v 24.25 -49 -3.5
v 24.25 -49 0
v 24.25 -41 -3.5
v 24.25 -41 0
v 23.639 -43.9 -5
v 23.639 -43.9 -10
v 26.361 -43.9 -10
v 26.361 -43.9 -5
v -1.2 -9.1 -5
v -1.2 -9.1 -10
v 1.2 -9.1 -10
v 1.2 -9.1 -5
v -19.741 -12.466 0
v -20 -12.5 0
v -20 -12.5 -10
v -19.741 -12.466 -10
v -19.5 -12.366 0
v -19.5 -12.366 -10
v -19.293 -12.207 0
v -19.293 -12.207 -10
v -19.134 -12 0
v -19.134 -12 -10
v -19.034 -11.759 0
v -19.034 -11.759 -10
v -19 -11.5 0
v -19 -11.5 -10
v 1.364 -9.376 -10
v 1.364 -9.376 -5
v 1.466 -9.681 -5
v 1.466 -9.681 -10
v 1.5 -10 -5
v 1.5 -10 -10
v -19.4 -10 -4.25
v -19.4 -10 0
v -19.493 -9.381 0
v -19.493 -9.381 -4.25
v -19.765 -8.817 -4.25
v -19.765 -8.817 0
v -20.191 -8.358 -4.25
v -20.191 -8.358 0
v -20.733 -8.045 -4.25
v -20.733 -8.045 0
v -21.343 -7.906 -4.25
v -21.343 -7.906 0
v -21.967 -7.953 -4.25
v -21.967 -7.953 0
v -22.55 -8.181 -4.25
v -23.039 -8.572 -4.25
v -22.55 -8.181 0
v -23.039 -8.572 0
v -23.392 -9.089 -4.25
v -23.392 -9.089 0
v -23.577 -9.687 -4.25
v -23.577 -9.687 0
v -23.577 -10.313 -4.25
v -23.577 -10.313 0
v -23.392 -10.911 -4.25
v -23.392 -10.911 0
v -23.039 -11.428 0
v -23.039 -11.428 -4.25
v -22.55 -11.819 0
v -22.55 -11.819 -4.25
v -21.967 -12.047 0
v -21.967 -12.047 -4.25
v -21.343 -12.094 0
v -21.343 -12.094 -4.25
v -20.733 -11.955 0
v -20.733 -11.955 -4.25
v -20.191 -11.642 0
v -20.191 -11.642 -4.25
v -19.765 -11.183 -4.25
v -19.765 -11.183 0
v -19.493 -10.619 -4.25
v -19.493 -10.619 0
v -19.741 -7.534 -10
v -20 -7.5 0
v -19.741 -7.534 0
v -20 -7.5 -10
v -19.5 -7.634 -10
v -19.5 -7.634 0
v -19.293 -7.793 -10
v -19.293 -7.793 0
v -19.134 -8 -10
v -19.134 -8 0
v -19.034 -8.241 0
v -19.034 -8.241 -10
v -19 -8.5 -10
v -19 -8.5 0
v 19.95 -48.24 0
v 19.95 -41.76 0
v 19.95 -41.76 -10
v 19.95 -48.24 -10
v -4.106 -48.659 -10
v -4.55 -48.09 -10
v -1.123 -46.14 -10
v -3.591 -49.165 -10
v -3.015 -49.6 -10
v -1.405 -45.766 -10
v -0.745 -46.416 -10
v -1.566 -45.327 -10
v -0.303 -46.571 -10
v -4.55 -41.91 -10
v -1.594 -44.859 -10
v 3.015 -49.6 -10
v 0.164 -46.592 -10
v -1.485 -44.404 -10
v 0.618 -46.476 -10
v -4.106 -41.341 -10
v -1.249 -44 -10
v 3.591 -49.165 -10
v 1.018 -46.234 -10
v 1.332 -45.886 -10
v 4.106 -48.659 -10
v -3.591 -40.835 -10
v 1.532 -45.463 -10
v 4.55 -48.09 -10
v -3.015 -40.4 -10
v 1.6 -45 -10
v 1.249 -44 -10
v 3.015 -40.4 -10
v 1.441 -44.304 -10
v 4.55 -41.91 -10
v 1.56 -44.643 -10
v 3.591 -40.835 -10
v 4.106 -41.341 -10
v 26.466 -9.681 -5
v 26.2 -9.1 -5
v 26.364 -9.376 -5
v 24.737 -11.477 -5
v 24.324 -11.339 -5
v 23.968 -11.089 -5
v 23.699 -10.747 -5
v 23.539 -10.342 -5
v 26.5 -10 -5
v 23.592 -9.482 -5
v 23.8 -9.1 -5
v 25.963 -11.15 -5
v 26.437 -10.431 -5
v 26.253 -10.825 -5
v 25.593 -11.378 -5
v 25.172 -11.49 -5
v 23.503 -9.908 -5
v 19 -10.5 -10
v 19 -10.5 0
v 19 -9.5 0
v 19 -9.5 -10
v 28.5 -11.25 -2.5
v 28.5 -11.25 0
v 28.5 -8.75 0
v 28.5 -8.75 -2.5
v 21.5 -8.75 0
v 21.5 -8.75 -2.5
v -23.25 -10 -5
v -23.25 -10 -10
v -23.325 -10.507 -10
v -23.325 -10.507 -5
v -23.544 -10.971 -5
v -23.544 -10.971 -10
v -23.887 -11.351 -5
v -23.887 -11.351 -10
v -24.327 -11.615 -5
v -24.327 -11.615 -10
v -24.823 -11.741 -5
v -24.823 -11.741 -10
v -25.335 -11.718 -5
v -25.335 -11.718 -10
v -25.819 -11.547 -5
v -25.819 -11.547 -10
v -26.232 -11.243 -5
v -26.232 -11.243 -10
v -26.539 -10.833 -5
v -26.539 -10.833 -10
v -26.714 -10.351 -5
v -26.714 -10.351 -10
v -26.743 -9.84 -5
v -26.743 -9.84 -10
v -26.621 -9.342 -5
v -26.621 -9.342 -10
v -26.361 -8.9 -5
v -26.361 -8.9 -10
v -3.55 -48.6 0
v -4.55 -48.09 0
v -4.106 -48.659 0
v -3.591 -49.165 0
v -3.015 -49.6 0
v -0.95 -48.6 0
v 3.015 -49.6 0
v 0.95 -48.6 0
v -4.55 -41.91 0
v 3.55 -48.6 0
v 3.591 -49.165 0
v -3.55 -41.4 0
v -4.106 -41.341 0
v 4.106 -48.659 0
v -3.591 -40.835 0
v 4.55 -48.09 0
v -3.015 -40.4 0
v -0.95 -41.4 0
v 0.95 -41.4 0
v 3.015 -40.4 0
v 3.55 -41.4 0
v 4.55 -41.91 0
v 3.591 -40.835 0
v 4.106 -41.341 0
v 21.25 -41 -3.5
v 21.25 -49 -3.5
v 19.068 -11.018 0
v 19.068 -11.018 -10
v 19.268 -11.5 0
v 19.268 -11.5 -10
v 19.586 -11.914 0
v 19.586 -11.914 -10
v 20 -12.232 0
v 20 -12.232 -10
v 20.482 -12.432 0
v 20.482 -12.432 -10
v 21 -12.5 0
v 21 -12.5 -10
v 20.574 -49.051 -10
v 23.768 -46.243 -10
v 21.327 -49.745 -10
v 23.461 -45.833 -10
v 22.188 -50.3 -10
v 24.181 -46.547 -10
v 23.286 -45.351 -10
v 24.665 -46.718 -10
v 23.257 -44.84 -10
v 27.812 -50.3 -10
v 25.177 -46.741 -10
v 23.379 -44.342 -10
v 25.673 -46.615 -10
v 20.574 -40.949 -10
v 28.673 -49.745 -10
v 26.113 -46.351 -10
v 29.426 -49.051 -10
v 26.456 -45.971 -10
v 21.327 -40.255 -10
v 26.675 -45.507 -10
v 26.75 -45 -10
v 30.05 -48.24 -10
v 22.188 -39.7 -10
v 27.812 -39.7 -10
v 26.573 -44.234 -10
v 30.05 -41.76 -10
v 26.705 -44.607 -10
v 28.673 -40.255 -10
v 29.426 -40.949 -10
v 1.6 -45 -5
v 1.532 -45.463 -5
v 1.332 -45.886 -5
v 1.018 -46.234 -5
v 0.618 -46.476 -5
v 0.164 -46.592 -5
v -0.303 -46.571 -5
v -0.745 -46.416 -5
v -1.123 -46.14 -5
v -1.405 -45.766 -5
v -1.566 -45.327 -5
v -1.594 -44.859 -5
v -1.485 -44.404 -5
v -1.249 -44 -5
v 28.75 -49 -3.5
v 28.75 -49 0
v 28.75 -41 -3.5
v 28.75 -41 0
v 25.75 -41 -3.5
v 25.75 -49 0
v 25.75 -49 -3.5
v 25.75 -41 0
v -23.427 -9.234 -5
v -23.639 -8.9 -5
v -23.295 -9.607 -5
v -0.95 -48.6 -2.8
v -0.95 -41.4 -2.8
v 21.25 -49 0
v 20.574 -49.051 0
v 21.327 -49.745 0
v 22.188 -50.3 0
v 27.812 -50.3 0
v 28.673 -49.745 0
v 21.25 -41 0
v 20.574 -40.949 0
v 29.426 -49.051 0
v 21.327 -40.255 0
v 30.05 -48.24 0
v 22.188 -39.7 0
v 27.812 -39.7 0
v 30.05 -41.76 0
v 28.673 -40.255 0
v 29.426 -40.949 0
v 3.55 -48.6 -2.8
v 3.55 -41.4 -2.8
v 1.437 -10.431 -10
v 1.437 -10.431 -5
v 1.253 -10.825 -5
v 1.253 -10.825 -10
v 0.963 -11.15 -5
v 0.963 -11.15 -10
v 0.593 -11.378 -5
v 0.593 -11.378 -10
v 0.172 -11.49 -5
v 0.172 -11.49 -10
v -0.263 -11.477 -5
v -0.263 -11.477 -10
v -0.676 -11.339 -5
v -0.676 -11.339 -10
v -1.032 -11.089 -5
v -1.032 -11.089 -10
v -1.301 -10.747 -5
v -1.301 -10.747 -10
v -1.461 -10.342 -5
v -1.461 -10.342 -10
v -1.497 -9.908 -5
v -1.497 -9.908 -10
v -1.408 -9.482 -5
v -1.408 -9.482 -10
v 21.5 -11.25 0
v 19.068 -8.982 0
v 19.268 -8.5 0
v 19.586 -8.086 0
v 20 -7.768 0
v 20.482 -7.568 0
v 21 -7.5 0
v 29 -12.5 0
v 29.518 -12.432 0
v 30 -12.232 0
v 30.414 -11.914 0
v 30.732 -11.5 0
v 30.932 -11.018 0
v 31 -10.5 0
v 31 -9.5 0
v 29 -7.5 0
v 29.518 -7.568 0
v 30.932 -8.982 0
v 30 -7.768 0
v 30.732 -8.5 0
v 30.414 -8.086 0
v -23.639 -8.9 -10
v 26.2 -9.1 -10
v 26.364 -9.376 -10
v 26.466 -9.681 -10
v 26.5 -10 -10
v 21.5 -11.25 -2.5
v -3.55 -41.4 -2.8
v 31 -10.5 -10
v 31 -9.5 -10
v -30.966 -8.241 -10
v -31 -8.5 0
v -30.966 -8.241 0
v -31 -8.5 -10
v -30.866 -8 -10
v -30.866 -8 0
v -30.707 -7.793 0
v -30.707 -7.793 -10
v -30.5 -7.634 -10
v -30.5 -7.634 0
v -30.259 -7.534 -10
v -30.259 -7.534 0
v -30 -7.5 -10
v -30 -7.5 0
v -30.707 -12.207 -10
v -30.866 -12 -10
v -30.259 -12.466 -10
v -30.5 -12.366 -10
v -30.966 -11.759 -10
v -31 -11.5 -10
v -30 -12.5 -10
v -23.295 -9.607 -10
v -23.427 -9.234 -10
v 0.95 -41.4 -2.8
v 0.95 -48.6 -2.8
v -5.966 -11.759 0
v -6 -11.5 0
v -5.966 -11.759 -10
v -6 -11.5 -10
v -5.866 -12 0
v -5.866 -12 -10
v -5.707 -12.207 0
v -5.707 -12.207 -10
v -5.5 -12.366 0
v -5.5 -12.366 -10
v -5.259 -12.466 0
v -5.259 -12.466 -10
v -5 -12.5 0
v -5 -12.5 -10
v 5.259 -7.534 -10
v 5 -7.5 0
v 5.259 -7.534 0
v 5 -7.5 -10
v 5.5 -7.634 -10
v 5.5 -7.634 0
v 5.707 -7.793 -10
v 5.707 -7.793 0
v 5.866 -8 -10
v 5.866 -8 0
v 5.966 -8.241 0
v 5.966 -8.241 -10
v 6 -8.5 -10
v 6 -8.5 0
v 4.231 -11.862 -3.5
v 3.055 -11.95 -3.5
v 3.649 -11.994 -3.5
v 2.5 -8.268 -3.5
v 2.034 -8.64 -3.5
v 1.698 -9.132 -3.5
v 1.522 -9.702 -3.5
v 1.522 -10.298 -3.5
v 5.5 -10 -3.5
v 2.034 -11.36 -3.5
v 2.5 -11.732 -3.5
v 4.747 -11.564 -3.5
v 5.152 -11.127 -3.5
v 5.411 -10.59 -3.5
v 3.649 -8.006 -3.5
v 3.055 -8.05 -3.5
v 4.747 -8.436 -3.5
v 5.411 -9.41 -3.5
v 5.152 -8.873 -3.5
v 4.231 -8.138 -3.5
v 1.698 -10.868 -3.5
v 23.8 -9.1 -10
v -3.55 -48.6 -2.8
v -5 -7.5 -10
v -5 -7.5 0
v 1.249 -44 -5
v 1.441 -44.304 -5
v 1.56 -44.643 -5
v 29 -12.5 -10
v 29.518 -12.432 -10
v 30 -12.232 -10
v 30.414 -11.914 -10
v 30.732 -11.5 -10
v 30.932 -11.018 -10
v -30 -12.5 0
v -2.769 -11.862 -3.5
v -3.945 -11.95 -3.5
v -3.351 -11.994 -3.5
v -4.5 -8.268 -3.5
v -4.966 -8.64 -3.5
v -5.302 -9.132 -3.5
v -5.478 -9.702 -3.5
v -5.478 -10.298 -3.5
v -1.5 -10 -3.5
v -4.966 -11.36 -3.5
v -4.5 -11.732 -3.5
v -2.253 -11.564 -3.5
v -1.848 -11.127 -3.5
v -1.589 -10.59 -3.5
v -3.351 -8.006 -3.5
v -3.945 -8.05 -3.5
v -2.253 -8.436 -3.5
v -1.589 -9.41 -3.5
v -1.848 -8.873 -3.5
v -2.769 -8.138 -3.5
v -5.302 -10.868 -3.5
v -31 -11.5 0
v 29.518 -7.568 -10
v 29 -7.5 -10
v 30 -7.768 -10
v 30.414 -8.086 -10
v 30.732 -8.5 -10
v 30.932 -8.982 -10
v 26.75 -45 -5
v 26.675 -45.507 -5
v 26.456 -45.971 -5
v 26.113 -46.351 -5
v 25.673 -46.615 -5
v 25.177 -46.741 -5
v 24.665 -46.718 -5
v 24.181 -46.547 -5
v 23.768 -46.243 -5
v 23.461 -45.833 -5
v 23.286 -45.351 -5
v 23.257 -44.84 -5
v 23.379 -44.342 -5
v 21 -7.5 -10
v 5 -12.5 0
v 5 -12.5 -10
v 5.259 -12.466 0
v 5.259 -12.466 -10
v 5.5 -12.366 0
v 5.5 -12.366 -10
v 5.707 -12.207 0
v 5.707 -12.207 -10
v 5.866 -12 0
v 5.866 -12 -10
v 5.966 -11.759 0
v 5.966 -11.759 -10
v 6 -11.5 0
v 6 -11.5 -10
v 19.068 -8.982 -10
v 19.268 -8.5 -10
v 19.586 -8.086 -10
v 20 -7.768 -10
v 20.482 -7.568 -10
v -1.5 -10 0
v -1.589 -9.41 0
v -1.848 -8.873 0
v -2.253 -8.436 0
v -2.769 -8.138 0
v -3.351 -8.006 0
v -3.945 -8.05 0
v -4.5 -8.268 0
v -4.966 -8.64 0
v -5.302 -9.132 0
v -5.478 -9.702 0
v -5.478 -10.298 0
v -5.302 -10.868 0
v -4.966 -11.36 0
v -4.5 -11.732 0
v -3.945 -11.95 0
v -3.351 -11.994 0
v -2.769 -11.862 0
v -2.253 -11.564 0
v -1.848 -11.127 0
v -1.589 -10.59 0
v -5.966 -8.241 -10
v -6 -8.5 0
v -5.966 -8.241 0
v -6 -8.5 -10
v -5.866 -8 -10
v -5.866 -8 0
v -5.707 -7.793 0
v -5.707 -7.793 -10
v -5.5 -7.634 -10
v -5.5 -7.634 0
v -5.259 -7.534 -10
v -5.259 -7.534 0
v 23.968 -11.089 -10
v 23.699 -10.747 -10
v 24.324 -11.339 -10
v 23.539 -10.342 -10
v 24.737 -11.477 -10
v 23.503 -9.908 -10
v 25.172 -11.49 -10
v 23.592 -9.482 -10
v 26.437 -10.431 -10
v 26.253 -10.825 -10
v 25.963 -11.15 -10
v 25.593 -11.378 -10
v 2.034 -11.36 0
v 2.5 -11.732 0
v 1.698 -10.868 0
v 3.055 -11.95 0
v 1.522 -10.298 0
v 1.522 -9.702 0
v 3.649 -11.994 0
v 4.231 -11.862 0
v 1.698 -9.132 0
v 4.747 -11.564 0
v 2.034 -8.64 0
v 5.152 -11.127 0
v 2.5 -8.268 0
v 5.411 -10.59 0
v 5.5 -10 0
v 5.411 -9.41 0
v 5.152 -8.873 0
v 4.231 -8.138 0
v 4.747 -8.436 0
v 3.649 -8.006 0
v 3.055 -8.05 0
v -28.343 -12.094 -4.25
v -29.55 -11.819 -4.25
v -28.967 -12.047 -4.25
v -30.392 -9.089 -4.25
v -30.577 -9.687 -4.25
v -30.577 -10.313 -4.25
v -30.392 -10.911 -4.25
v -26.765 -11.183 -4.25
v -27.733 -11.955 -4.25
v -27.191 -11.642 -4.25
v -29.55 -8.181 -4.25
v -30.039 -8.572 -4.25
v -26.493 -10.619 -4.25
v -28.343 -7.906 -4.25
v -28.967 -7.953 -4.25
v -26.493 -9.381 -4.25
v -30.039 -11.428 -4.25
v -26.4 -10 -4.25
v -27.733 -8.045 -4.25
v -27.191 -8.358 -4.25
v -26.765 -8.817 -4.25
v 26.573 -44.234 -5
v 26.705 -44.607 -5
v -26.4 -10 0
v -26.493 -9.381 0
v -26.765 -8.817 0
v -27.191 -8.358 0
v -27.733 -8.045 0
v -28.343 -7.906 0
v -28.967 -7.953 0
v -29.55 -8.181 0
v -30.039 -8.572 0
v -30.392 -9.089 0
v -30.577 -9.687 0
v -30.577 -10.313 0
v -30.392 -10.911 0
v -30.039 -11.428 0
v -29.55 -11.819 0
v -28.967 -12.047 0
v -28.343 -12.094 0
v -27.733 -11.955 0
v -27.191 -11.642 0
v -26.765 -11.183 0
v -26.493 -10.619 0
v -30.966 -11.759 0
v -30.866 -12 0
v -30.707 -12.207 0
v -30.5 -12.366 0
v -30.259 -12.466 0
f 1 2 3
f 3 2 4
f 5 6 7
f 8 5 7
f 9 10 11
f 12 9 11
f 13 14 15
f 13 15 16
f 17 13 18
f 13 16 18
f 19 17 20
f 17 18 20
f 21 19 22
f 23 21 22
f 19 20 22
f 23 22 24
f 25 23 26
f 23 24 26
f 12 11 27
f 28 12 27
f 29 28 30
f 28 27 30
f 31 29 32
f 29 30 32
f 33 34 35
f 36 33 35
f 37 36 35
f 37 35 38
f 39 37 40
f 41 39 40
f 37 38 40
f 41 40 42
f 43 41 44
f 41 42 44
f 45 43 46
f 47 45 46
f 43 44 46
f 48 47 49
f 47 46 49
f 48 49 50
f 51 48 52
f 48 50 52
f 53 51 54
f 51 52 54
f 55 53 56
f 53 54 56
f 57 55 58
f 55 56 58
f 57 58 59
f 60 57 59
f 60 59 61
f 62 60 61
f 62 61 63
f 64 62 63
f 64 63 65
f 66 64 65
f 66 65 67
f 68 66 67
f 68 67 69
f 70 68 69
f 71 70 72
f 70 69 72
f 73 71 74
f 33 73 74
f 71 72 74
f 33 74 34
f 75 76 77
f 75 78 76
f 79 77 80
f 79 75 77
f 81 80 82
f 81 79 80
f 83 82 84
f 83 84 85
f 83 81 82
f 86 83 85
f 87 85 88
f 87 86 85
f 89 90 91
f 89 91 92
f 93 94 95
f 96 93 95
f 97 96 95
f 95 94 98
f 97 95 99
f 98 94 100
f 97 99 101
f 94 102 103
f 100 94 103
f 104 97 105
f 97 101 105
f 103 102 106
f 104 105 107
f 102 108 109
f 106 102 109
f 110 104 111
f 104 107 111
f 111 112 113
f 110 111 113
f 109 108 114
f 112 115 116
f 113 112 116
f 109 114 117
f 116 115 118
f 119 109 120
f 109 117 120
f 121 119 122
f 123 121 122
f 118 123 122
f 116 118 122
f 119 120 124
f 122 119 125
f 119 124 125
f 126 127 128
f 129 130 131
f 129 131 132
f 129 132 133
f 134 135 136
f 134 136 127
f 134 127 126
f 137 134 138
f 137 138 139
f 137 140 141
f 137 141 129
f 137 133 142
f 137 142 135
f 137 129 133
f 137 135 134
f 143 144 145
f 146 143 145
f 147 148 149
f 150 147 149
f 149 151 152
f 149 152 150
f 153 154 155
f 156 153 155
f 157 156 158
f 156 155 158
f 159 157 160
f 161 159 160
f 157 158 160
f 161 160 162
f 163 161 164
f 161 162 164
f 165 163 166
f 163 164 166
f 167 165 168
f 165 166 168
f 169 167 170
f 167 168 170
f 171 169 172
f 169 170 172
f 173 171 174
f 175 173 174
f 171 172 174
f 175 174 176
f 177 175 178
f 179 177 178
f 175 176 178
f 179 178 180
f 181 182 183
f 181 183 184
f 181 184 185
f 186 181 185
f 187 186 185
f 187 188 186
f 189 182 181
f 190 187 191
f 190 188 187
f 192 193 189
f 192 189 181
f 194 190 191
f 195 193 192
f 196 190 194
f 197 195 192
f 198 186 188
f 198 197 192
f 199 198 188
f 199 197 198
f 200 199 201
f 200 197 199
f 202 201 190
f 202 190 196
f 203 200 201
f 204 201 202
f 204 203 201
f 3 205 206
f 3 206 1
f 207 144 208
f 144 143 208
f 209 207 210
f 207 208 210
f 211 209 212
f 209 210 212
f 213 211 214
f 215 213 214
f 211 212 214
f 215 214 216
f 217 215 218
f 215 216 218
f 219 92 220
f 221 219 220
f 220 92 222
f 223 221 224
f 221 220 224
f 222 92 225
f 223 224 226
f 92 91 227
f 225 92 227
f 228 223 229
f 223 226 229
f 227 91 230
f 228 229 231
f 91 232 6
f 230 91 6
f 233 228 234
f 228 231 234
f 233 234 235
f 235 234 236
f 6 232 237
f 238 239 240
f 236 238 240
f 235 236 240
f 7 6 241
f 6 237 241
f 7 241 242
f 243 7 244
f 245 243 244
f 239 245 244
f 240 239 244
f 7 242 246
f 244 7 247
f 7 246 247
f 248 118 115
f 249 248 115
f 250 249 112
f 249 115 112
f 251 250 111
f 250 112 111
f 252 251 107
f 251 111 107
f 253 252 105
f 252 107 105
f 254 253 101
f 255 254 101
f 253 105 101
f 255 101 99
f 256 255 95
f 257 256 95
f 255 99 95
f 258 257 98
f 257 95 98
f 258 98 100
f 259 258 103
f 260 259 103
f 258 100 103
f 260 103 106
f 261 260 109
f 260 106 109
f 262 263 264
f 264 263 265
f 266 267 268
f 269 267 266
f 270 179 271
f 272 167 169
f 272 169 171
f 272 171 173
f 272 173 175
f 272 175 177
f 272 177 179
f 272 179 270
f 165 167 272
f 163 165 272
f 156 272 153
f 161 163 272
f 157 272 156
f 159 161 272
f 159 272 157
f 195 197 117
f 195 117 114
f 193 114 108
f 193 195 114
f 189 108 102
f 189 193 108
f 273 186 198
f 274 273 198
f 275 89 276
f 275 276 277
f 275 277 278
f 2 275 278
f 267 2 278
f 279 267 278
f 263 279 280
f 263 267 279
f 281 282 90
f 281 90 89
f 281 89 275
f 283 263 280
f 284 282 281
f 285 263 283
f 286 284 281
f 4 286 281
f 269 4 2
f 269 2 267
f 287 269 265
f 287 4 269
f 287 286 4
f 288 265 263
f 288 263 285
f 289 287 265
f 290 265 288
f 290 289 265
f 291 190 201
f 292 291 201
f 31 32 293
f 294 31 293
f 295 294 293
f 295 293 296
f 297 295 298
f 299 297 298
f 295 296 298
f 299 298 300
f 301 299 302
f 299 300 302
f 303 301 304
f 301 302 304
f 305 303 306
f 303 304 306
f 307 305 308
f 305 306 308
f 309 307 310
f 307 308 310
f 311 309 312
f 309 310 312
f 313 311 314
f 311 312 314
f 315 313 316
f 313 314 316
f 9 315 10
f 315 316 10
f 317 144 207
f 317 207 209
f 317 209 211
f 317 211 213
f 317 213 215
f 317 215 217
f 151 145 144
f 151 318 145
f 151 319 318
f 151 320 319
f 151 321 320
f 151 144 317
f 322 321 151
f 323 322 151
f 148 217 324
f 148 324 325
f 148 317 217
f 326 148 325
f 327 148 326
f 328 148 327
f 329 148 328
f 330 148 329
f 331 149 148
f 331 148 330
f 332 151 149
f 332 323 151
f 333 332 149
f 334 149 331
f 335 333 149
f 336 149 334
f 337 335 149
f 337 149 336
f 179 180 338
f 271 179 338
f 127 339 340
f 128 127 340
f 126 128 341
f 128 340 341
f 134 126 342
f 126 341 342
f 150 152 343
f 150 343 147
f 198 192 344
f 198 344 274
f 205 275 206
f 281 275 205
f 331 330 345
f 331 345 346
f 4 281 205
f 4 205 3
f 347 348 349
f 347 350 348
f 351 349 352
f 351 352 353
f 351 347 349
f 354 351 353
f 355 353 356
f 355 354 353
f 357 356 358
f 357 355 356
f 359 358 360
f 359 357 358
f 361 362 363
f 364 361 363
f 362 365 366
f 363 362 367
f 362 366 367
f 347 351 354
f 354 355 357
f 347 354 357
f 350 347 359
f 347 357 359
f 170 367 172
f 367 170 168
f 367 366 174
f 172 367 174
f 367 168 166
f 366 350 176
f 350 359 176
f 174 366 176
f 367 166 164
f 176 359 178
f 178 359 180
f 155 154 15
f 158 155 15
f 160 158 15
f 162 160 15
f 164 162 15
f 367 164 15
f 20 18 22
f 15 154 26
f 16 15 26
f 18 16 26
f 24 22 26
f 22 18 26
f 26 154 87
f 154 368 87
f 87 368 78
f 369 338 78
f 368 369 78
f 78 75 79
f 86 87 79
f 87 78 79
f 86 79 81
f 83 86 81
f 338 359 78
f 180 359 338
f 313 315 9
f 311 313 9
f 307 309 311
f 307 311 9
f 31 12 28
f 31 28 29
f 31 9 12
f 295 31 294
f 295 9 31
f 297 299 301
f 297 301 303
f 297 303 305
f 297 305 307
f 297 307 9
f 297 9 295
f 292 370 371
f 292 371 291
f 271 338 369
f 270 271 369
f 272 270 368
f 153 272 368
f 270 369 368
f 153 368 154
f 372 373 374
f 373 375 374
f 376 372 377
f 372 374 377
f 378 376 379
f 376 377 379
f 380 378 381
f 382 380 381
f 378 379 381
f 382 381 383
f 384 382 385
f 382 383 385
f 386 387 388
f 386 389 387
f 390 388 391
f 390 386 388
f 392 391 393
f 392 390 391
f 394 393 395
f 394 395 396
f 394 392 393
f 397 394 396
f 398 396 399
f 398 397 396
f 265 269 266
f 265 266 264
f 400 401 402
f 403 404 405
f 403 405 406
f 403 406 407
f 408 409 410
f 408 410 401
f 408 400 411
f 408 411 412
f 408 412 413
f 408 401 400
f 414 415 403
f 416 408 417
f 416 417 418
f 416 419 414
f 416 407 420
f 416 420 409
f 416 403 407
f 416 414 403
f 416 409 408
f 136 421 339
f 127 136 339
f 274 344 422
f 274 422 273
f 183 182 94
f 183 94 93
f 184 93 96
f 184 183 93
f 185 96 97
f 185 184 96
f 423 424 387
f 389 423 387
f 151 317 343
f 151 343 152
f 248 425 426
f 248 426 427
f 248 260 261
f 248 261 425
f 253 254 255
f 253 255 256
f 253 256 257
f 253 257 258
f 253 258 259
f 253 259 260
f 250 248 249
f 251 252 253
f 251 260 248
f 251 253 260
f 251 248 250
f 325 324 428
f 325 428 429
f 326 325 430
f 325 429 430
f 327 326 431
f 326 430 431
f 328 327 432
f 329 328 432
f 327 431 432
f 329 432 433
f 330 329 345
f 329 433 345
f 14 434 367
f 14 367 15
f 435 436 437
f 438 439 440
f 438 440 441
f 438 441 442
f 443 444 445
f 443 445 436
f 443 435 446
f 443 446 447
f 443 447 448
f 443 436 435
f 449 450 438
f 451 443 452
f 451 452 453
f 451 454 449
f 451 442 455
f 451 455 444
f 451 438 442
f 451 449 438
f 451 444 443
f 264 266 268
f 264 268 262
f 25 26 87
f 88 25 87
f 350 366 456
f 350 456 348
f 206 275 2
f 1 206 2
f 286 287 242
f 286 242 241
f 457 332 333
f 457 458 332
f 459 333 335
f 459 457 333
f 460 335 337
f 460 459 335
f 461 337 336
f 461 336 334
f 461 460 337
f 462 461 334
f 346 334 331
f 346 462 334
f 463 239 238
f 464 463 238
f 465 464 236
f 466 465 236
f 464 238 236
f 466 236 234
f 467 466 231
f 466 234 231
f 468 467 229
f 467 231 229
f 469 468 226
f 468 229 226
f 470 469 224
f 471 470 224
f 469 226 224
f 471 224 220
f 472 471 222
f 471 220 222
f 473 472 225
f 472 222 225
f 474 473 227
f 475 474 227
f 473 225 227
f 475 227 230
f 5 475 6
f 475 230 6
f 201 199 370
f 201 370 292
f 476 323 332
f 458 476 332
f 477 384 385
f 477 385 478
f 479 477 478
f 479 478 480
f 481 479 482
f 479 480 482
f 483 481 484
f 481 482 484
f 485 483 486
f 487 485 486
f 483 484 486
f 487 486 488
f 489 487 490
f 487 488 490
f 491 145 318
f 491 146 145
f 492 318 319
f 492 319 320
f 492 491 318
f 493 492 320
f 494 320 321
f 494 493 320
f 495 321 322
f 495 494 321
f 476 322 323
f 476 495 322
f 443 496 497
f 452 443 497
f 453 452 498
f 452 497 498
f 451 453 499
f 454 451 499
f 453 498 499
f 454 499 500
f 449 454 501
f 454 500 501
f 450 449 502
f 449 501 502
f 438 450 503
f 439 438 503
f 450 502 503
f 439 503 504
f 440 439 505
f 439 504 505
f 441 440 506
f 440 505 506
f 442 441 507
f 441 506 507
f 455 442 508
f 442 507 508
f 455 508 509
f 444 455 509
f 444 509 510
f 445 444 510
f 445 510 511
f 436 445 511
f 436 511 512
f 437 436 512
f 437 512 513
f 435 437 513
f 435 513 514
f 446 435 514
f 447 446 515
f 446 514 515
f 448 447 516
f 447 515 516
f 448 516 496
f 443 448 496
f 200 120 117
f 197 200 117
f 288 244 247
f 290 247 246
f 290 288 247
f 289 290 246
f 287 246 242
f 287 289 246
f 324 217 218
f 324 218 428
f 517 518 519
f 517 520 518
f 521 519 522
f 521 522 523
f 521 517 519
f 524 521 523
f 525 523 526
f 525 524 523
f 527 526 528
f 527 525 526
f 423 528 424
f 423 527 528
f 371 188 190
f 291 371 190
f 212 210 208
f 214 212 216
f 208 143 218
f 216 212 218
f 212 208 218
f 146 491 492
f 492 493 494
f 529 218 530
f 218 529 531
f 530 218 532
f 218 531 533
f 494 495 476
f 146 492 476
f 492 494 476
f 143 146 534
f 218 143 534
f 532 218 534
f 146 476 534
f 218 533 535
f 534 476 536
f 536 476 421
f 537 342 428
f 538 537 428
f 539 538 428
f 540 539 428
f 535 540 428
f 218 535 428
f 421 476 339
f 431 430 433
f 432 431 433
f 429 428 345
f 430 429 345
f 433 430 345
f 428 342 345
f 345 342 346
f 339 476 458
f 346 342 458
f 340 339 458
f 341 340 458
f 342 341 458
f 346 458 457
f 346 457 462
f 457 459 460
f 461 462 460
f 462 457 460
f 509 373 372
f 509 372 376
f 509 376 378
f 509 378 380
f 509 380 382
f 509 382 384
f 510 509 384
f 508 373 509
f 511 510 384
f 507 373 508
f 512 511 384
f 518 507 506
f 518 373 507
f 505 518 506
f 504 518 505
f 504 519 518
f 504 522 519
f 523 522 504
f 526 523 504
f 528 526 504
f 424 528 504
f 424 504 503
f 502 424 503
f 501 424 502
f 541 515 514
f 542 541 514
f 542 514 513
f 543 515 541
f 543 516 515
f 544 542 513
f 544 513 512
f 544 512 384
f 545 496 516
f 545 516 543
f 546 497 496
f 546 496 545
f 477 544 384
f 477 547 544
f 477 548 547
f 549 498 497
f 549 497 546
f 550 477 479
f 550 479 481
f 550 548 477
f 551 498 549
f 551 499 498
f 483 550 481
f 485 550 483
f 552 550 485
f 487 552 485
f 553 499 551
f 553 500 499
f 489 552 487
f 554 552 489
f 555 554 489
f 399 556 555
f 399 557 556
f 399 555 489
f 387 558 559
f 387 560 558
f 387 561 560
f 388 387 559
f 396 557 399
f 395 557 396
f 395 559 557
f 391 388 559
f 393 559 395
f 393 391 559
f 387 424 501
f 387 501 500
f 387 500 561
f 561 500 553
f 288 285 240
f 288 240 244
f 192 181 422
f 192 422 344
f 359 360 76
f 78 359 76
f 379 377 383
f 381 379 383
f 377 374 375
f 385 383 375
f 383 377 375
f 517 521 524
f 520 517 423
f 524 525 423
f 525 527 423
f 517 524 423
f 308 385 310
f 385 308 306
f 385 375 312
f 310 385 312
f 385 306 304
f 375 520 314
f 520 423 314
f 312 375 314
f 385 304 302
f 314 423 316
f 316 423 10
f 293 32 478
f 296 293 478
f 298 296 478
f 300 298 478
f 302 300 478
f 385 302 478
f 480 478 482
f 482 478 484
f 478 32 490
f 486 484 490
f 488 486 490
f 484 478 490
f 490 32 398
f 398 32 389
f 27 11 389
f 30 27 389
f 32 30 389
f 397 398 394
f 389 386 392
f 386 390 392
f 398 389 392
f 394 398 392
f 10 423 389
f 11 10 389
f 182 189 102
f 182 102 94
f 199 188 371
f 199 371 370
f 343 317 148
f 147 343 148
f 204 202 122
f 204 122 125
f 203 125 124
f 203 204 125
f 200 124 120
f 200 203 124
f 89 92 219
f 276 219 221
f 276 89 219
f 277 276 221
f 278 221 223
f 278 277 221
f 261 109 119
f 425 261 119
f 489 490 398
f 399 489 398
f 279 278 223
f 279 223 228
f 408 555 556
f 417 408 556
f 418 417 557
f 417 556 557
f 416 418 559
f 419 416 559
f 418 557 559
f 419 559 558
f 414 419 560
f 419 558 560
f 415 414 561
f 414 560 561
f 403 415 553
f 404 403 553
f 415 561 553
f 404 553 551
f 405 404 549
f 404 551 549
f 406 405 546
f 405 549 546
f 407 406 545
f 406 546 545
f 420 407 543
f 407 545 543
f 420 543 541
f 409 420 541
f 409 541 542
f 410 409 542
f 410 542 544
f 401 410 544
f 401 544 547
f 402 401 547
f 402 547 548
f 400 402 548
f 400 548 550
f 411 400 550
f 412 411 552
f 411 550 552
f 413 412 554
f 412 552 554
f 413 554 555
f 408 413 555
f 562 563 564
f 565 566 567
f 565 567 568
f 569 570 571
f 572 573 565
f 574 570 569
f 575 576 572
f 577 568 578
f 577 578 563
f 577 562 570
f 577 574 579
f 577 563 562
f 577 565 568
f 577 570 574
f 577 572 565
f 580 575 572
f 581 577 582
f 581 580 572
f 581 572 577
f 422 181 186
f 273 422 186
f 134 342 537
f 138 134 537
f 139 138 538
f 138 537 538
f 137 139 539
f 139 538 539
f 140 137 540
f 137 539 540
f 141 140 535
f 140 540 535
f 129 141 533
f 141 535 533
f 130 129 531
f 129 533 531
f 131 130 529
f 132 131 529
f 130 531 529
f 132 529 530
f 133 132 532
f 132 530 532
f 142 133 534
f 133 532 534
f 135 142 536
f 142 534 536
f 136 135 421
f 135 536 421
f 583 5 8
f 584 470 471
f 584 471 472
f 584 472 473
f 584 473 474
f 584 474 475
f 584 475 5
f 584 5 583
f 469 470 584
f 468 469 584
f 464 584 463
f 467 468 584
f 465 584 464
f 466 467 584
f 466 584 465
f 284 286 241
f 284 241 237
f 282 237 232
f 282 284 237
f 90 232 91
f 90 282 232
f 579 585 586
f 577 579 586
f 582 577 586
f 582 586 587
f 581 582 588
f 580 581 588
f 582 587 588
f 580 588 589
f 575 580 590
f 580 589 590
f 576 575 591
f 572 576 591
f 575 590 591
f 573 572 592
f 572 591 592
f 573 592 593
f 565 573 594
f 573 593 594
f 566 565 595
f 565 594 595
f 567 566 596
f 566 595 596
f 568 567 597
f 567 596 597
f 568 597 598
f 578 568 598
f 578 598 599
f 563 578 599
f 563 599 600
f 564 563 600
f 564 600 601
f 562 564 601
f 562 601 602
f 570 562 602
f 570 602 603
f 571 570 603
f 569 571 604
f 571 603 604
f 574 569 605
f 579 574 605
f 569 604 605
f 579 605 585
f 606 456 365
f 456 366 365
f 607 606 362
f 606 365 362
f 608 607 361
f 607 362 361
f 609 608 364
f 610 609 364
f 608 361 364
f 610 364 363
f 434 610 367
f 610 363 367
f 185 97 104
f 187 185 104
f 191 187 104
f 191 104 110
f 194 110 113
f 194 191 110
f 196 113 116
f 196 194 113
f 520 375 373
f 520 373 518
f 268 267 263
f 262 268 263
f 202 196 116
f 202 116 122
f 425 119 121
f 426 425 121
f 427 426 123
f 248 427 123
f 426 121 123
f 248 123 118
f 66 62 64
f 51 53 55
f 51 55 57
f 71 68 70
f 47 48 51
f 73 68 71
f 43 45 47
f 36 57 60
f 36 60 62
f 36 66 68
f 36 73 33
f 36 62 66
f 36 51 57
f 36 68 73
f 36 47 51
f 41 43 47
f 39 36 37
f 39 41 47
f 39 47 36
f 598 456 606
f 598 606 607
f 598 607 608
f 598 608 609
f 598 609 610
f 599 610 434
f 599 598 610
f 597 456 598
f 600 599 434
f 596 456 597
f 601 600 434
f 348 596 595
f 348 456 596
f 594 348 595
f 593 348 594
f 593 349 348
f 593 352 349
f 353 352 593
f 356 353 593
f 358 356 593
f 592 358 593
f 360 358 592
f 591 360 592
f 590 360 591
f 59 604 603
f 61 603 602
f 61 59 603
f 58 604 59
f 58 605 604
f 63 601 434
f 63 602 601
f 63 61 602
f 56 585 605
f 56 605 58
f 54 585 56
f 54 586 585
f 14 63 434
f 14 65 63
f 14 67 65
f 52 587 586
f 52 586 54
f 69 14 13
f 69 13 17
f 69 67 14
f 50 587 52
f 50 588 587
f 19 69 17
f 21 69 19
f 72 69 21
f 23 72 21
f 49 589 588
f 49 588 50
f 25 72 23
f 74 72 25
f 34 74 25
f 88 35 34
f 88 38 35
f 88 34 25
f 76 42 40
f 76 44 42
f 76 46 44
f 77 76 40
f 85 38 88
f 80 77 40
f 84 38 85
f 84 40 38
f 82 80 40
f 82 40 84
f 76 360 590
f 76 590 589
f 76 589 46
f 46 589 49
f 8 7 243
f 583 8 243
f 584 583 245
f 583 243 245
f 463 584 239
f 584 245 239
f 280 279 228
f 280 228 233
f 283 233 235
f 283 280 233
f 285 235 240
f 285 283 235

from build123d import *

# Parameters (mm, degrees)
F0_W      = 12
F0_H      = 5
F0_R      = 2
F1_DEPTH  = 10
F2_DEPTH  = 3.5
F4_R      = 1
F0_W_2    = 7
F0_H_2    = 2.5
F5_DEPTH  = 10
F7_DEPTH  = 2.5
F8_DEPTH  = 5
F9_R      = 2
F10_DEPTH = 5
F0_W_3    = 2.6
F0_H_3    = 7.2
F11_DEPTH = 10
F12_DEPTH = 2.8
F14_DEPTH = 5
F0_W_4    = 3
F0_H_4    = 8
F15_DEPTH = 10
F16_DEPTH = 3.5
F18_DEPTH = 5
F0_R_2    = 2.1
F19_DEPTH = 10
F20_DEPTH = 4.25
F22_DEPTH = 5
F23_R     = 1


with BuildPart() as f1:
    # F0 (on Top) → F1 (new body)
    with BuildSketch(Plane.XY):
        with Locations((0, -10)):
            Rectangle(F0_W, F0_H)
        with Locations((-3.5, -10)):
            Circle(F0_R, mode=Mode.SUBTRACT)
        with Locations((3.5, -10)):
            Circle(F0_R, mode=Mode.SUBTRACT)
        with Locations((-3.5, -10)):
            Circle(F0_R)
        with Locations((3.5, -10)):
            Circle(F0_R)
    extrude(amount=-F1_DEPTH)

    # F0 (on Top) → F2 (cut)
    with BuildSketch(Plane.XY):
        with Locations((-3.5, -10)):
            Circle(F0_R)
        with Locations((3.5, -10)):
            Circle(F0_R)
    extrude(amount=-F2_DEPTH, mode=Mode.SUBTRACT)

    # F4
    f4_edges = [f1.edges().sort_by_distance(p)[0] for p in [
        (6, -12.5, -5),
        (6, -7.5, -5),
        (-6, -12.5, -5),
        (-6, -7.5, -5),
    ]]
    fillet(f4_edges, radius=F4_R)

    # F3 (on face) → F10 (cut)
    with BuildSketch(Plane(origin=(0, 0, -10), x_dir=(1, 0, 0), z_dir=(0, 0, -1))):
        with BuildLine():
            ThreePointArc((1.2, 9.1), (1.4230249471, 9.525658351), (1.5, 10))
            ThreePointArc((1.5, 10), (-0.474341649, 11.4230249471), (-1.2, 9.1))
            Line((-1.2, 9.1), (1.2, 9.1))
        make_face()
    extrude(amount=-F10_DEPTH, mode=Mode.SUBTRACT)


with BuildPart() as f5:
    # F0 (on Top) → F5 (new body)
    with BuildSketch(Plane.XY):
        with Locations((25, -10)):
            Rectangle(F0_W, F0_H)
        with Locations((25, -10)):
            Rectangle(F0_W_2, F0_H_2, mode=Mode.SUBTRACT)
        with Locations((25, -10)):
            Rectangle(F0_W_2, F0_H_2)
    extrude(amount=-F5_DEPTH)

    # F0 (on Top) → F7 (cut)
    with BuildSketch(Plane.XY):
        with Locations((25, -10)):
            Rectangle(F0_W_2, F0_H_2)
    extrude(amount=-F7_DEPTH, mode=Mode.SUBTRACT)

    # F6 (on face) → F8 (cut)
    with BuildSketch(Plane(origin=(0, 0, -10), x_dir=(1, 0, 0), z_dir=(0, 0, -1))):
        with BuildLine():
            ThreePointArc((26.2, 9.1), (26.4230249471, 9.525658351), (26.5, 10))
            ThreePointArc((26.5, 10), (24.525658351, 11.4230249471), (23.8, 9.1))
            Line((23.8, 9.1), (26.2, 9.1))
        make_face()
    extrude(amount=-F8_DEPTH, mode=Mode.SUBTRACT)

    # F9
    f9_edges = [f5.edges().sort_by_distance(p)[0] for p in [
        (19, -12.5, -5),
        (31, -12.5, -5),
        (31, -7.5, -5),
        (19, -7.5, -5),
    ]]
    fillet(f9_edges, radius=F9_R)


with BuildPart() as f11:
    # F0 (on Top) → F11 (new body)
    with BuildSketch(Plane.XY):
        with BuildLine():
            Line((4.55, -48.0899029111), (4.55, -41.9100970889))
            ThreePointArc((4.55, -41.9100970889), (3.8571055749, -41.0791918455), (3.0149626863, -40.4))
            Line((3.0149626863, -40.4), (-3.0149626863, -40.4))
            ThreePointArc((-3.0149626863, -40.4), (-3.8571055749, -41.0791918455), (-4.55, -41.9100970889))
            Line((-4.55, -41.9100970889), (-4.55, -48.0899029111))
            ThreePointArc((-4.55, -48.0899029111), (-3.8571055749, -48.9208081545), (-3.0149626863, -49.6))
            Line((-3.0149626863, -49.6), (3.0149626863, -49.6))
            ThreePointArc((3.0149626863, -49.6), (3.8571055749, -48.9208081545), (4.55, -48.0899029111))
        make_face()
        with Locations((-2.25, -45)):
            Rectangle(F0_W_3, F0_H_3, mode=Mode.SUBTRACT)
        with Locations((2.25, -45)):
            Rectangle(F0_W_3, F0_H_3, mode=Mode.SUBTRACT)
        with Locations((-2.25, -45)):
            Rectangle(F0_W_3, F0_H_3)
        with Locations((2.25, -45)):
            Rectangle(F0_W_3, F0_H_3)
    extrude(amount=-F11_DEPTH)

    # F0 (on Top) → F12 (cut)
    with BuildSketch(Plane.XY):
        with Locations((-2.25, -45)):
            Rectangle(F0_W_3, F0_H_3)
        with Locations((2.25, -45)):
            Rectangle(F0_W_3, F0_H_3)
    extrude(amount=-F12_DEPTH, mode=Mode.SUBTRACT)

    # F13 (on face) → F14 (cut)
    with BuildSketch(Plane(origin=(0, 0, -10), x_dir=(1, 0, 0), z_dir=(0, 0, -1))):
        with BuildLine():
            ThreePointArc((1.2489995997, 44), (1.5097018513, 44.4700940458), (1.6, 45))
            ThreePointArc((1.6, 45), (-0.5299059542, 46.5097018513), (-1.2489995997, 44))
            Line((-1.2489995997, 44), (1.2489995997, 44))
        make_face()
    extrude(amount=-F14_DEPTH, mode=Mode.SUBTRACT)


with BuildPart() as f15:
    # F0 (on Top) → F15 (new body)
    with BuildSketch(Plane.XY):
        with BuildLine():
            Line((30.05, -48.2399845679), (30.05, -41.7600154321))
            ThreePointArc((30.05, -41.7600154321), (29.0639307642, -40.5858787121), (27.8124722221, -39.7))
            Line((27.8124722221, -39.7), (22.1875277779, -39.7))
            ThreePointArc((22.1875277779, -39.7), (20.9360692358, -40.5858787121), (19.95, -41.7600154321))
            Line((19.95, -41.7600154321), (19.95, -48.2399845679))
            ThreePointArc((19.95, -48.2399845679), (20.9360692358, -49.4141212879), (22.1875277779, -50.3))
            Line((22.1875277779, -50.3), (27.8124722221, -50.3))
            ThreePointArc((27.8124722221, -50.3), (29.0639307642, -49.4141212879), (30.05, -48.2399845679))
        make_face()
        with Locations((22.75, -45)):
            Rectangle(F0_W_4, F0_H_4, mode=Mode.SUBTRACT)
        with Locations((27.25, -45)):
            Rectangle(F0_W_4, F0_H_4, mode=Mode.SUBTRACT)
        with Locations((22.75, -45)):
            Rectangle(F0_W_4, F0_H_4)
        with Locations((27.25, -45)):
            Rectangle(F0_W_4, F0_H_4)
    extrude(amount=-F15_DEPTH)

    # F0 (on Top) → F16 (cut)
    with BuildSketch(Plane.XY):
        with Locations((22.75, -45)):
            Rectangle(F0_W_4, F0_H_4)
        with Locations((27.25, -45)):
            Rectangle(F0_W_4, F0_H_4)
    extrude(amount=-F16_DEPTH, mode=Mode.SUBTRACT)

    # F17 (on face) → F18 (cut)
    with BuildSketch(Plane(origin=(0, 0, -10), x_dir=(1, 0, 0), z_dir=(0, 0, -1))):
        with BuildLine():
            ThreePointArc((26.3610657589, 43.9), (26.6499037969, 44.4166326535), (26.75, 45))
            ThreePointArc((26.75, 45), (24.4166326535, 46.6499037969), (23.6389342411, 43.9))
            Line((23.6389342411, 43.9), (26.3610657589, 43.9))
        make_face()
    extrude(amount=-F18_DEPTH, mode=Mode.SUBTRACT)


with BuildPart() as f19:
    # F0 (on Top) → F19 (new body)
    with BuildSketch(Plane.XY):
        with Locations((-25, -10)):
            Rectangle(F0_W, F0_H)
        with Locations((-28.5, -10)):
            Circle(F0_R_2, mode=Mode.SUBTRACT)
        with Locations((-21.5, -10)):
            Circle(F0_R_2, mode=Mode.SUBTRACT)
        with Locations((-21.5, -10)):
            Circle(F0_R_2)
        with Locations((-28.5, -10)):
            Circle(F0_R_2)
    extrude(amount=-F19_DEPTH)

    # F0 (on Top) → F20 (cut)
    with BuildSketch(Plane.XY):
        with Locations((-21.5, -10)):
            Circle(F0_R_2)
        with Locations((-28.5, -10)):
            Circle(F0_R_2)
    extrude(amount=-F20_DEPTH, mode=Mode.SUBTRACT)

    # F21 (on face) → F22 (cut)
    with BuildSketch(Plane(origin=(0, 0, -10), x_dir=(1, 0, 0), z_dir=(0, 0, -1))):
        with BuildLine():
            ThreePointArc((-23.6389342411, 8.9), (-23.3500962031, 9.4166326535), (-23.25, 10))
            ThreePointArc((-23.25, 10), (-25.5833673465, 11.6499037969), (-26.3610657589, 8.9))
            Line((-26.3610657589, 8.9), (-23.6389342411, 8.9))
        make_face()
    extrude(amount=-F22_DEPTH, mode=Mode.SUBTRACT)

    # F23
    f23_edges = [f19.edges().sort_by_distance(p)[0] for p in [
        (-31, -7.5, -5),
        (-31, -12.5, -5),
        (-19, -7.5, -5),
        (-19, -12.5, -5),
    ]]
    fillet(f23_edges, radius=F23_R)


solid = Compound([f1.part, f5.part, f11.part, f15.part, f19.part])
